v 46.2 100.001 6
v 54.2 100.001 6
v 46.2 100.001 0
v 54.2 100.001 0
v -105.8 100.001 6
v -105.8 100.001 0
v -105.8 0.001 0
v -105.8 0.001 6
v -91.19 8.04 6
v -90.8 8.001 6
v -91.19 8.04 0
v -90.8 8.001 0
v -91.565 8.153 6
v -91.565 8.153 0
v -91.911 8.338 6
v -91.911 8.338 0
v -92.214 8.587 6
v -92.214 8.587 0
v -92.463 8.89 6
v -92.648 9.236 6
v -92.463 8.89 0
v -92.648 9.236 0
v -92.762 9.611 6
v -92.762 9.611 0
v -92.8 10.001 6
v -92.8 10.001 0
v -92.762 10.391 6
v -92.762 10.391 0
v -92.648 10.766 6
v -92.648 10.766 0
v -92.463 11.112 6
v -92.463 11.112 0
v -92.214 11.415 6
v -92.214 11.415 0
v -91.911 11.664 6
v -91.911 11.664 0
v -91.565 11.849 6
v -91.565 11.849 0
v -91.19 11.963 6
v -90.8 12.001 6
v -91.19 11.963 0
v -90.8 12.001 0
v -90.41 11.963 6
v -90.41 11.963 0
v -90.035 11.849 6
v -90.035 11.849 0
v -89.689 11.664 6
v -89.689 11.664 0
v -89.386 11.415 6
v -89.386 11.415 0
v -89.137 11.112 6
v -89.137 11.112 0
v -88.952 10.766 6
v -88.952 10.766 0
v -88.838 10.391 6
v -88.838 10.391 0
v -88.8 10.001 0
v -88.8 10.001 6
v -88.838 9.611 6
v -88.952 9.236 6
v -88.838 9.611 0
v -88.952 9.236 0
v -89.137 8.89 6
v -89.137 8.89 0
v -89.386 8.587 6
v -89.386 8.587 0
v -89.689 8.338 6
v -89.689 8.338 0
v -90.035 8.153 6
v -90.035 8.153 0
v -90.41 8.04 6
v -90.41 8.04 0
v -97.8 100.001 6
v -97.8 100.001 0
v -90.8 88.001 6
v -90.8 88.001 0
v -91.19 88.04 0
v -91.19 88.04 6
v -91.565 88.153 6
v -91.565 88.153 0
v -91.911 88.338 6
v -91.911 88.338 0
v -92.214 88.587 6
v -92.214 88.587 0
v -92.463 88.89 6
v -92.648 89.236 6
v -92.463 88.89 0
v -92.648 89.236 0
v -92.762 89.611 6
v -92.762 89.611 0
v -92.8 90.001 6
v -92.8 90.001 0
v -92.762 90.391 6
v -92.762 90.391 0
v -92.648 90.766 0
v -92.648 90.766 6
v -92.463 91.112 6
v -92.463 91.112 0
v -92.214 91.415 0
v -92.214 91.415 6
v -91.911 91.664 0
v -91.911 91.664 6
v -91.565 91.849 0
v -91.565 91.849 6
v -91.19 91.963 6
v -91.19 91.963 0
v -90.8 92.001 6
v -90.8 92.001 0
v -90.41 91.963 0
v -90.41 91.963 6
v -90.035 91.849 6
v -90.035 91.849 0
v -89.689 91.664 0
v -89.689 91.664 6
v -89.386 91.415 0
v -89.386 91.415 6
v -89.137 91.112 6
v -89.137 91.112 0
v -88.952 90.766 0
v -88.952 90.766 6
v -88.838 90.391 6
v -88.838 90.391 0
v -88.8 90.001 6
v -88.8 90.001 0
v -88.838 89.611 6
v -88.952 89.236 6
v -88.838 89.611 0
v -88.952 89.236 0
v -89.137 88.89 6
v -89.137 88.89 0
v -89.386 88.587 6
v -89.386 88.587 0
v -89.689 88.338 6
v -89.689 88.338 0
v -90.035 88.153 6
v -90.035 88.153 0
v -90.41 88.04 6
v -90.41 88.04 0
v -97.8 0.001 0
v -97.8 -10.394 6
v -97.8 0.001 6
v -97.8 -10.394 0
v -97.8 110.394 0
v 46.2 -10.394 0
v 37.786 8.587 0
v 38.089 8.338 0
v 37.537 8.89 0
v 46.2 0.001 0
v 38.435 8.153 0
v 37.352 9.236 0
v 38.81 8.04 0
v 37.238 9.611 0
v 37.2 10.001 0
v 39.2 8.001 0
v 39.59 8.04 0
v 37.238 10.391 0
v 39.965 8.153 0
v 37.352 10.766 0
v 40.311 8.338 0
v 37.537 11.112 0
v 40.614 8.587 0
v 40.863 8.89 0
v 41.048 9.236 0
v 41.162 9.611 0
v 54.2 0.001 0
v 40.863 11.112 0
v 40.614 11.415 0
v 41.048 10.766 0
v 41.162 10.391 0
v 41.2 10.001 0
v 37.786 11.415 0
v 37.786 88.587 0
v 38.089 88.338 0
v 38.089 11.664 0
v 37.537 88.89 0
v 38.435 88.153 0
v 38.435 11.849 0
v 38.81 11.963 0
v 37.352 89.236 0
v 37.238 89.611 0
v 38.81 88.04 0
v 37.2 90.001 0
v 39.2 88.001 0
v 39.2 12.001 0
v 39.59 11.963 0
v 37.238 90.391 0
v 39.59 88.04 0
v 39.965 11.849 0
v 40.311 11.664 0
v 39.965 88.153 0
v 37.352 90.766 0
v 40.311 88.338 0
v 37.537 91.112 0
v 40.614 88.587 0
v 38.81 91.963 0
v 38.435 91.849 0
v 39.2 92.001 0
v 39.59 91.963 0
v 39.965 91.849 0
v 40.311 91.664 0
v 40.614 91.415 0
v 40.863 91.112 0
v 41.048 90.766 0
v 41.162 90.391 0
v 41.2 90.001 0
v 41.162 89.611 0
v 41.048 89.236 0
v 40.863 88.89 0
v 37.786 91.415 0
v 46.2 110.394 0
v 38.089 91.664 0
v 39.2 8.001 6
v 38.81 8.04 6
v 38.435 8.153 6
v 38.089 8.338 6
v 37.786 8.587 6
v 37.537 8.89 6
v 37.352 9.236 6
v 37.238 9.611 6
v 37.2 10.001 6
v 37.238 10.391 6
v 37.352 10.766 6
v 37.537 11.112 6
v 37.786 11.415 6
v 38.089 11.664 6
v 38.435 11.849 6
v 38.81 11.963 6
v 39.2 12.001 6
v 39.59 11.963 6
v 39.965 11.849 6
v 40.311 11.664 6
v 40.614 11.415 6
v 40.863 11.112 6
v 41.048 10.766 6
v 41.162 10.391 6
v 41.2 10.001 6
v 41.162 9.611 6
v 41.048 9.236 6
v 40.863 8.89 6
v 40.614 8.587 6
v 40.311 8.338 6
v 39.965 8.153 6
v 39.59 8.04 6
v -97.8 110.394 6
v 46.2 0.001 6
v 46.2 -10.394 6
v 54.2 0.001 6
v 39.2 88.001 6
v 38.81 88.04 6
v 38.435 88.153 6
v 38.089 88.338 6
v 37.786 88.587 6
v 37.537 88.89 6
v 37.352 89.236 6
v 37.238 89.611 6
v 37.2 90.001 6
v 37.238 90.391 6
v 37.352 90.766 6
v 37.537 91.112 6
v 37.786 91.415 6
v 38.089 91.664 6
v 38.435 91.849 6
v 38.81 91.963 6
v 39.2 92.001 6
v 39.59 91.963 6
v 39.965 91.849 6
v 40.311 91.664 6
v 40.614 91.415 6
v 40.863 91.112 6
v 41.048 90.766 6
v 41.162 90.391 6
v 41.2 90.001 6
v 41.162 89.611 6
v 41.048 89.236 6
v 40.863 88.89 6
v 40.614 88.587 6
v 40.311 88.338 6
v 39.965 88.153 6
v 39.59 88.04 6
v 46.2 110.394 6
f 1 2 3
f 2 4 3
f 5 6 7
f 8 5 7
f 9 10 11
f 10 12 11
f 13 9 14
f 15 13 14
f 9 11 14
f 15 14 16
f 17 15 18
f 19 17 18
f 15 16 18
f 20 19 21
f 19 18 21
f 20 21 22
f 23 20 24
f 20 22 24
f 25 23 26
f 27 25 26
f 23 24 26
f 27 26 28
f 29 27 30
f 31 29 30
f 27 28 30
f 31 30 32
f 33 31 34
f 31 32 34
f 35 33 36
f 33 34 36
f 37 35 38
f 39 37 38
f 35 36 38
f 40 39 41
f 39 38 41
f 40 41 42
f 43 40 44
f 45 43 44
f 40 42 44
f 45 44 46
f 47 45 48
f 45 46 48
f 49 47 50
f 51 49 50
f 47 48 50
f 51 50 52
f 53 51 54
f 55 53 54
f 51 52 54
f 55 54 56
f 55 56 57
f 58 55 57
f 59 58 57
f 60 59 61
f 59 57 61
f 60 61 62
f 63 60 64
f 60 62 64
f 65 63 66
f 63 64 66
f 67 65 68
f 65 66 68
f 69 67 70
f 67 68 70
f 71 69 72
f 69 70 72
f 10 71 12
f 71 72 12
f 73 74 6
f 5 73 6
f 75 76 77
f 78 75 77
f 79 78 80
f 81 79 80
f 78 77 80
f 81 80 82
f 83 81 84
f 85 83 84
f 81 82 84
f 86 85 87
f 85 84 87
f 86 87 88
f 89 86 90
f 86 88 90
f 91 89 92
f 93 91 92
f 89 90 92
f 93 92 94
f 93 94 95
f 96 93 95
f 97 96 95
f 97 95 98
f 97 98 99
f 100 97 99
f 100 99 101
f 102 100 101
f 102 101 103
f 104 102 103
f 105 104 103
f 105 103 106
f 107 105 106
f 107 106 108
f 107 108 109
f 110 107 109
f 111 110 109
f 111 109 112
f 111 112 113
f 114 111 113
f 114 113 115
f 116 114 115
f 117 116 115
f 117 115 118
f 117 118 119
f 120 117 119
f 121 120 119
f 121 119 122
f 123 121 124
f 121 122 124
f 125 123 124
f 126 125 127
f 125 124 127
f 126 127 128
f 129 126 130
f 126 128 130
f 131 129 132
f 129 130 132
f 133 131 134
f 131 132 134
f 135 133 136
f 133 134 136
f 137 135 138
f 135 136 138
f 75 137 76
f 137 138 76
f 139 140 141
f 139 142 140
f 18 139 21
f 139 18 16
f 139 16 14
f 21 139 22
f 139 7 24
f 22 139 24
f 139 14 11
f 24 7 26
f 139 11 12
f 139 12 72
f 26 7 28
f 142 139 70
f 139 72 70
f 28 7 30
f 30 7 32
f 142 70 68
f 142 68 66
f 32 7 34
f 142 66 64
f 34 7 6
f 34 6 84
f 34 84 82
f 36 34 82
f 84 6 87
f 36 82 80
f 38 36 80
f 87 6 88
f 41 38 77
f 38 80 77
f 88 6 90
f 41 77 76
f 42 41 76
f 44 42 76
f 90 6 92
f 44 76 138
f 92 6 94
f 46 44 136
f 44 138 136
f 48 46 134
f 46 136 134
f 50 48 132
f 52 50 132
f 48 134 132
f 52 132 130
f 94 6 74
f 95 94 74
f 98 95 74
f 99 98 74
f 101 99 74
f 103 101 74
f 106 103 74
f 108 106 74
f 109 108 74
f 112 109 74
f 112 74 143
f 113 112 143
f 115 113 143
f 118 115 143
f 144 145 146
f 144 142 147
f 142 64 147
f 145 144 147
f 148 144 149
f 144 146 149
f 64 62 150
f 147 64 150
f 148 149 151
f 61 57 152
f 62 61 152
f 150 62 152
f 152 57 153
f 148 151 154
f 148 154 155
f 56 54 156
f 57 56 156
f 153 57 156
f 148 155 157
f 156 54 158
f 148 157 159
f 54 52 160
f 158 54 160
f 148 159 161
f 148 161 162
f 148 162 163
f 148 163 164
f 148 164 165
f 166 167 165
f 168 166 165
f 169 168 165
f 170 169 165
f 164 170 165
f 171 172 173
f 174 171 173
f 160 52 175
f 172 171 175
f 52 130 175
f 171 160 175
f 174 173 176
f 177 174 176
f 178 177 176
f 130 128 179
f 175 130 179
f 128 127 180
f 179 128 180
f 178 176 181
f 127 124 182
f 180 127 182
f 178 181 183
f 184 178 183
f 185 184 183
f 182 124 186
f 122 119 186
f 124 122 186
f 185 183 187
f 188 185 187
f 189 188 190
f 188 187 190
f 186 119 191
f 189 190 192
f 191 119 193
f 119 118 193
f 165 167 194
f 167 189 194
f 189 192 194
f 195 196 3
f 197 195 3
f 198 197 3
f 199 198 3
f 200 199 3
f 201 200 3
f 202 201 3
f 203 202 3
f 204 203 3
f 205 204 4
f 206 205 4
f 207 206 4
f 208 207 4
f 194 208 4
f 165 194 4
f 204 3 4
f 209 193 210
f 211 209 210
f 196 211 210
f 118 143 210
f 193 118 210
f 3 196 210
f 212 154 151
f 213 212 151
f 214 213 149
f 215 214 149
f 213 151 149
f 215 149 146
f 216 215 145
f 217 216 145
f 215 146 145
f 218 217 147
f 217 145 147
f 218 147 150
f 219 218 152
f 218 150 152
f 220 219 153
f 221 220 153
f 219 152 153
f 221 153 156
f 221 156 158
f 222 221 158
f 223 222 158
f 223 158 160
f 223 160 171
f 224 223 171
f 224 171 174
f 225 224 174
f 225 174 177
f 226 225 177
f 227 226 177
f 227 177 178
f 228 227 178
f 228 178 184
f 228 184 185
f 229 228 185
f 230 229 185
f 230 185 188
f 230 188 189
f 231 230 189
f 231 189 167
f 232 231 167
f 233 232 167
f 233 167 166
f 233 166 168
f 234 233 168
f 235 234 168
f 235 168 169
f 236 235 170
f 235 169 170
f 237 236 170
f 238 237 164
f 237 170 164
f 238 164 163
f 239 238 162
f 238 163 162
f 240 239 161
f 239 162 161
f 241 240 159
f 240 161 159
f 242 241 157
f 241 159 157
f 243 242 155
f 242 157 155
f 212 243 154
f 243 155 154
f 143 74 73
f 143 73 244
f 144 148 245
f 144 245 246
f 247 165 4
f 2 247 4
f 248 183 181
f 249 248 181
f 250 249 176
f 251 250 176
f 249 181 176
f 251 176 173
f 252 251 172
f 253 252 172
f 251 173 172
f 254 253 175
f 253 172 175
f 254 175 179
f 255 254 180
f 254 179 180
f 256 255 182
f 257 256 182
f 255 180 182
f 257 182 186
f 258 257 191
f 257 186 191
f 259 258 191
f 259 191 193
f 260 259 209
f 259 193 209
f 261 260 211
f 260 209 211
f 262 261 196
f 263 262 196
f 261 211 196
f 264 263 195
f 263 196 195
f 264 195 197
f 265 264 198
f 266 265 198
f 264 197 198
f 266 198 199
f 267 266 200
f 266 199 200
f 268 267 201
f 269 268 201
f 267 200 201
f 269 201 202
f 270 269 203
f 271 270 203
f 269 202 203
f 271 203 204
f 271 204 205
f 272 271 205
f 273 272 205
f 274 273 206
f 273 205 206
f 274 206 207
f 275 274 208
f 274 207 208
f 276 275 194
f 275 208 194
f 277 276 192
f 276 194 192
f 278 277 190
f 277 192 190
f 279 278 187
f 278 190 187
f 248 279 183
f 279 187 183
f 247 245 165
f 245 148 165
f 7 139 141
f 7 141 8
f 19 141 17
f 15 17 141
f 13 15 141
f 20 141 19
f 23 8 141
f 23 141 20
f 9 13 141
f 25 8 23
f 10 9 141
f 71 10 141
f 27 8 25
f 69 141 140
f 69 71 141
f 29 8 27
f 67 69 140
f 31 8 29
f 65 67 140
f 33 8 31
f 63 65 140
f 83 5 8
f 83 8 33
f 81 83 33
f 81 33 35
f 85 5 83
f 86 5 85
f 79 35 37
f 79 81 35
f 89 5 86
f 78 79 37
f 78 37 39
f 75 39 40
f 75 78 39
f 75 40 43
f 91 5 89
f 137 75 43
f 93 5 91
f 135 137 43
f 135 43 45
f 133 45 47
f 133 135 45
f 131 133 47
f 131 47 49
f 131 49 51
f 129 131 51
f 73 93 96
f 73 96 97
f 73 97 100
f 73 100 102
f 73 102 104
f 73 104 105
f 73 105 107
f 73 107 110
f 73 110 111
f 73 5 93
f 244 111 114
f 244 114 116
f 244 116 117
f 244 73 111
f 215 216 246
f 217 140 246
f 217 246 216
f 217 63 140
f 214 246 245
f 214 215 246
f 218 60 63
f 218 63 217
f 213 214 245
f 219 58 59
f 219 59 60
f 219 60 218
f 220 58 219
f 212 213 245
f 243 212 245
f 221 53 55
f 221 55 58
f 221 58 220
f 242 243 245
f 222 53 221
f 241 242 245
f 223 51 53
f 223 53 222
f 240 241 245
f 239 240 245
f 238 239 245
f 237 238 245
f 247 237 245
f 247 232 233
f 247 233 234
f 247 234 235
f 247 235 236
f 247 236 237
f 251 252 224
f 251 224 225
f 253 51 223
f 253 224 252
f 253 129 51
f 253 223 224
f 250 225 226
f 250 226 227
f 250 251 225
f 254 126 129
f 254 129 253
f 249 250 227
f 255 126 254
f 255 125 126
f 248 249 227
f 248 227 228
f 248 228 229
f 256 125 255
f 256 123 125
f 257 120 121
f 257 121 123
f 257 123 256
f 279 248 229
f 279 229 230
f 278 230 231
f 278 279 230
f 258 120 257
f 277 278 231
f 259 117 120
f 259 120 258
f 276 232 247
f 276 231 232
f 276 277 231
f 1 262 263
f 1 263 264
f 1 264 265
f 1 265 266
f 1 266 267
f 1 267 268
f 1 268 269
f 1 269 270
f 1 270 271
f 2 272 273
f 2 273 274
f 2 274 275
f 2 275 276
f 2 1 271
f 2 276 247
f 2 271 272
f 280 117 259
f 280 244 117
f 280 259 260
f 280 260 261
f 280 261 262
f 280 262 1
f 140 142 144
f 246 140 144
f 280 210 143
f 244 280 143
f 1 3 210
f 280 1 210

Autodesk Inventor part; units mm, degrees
ref_plane "YZ Plane" through (0, 0, 0) normal (1, 0, 0) x (0, 1, 0)
ref_plane "XZ Plane" through (0, 0, 0) normal (0, 1, 0) x (-1, 0, 0)
ref_plane "XY Plane" through (0, 0, 0) normal (0, 0, 1) x (1, 0, 0)
sketch "Skizze1" plane through (0, 0, 0) normal (0, 0, 1) x (1, 0, 0)
  line L0 (-102.3641, 100) -> (-101.6, 100) construction
  line L1 (-101.6, 0) -> (-102.3641, 0) construction
  line L2 (19.2, -16.0826) -> (-120.8, -16.0826) construction
  line L3 (-120.8, -16.0826) -> (-120.8, -13.8079) construction
  line L4 (-120.8, -13.8079) -> (19.2, -13.8079) construction
  line L5 (19.2, -13.8079) -> (19.2, -16.0826) construction
  line L6 (19.2, -28.3315) -> (-120.8, -28.3315) construction
  line L7 (-120.8, -28.3315) -> (-120.8, -24.6314) construction
  line L8 (-120.8, -24.6314) -> (19.2, -24.6314) construction
  line L9 (19.2, -24.6314) -> (19.2, -28.3315) construction
  line L10 (-120.8, 124.6314) -> (-120.8, 128.3315) construction
  line L11 (19.2, 128.3315) -> (19.2, 124.6314) construction
  line L12 (19.2, 116.0826) -> (19.2, 113.8079) construction
  line L13 (0, 100) -> (0.7641, 100) construction
  line L14 (0.7641, 0) -> (0, 0) construction
  line L15 (17.6359, 100) -> (18.4, 100) construction
  line L16 (18.4, 0) -> (17.6359, 0) construction
  line L17 (5.1816, 100) -> (13.2184, 100) construction
  line L18 (13.2184, 0) -> (5.1816, 0) construction
  line L19 (69.2, -3.3397) -> (-120.8, -3.3397) construction
  line L20 (69.2, 103.3397) -> (-120.8, 103.3397) construction
  line L21 (-105.8, 0.0011) -> (54.2, 0.0011)
  line L22 (54.2, 0.0011) -> (54.2, 100.0011)
  line L23 (54.2, 100.0011) -> (-105.8, 100.0011)
  line L24 (-105.8, 100.0011) -> (-105.8, 0.0011)
  line L25 (69.2, -9.3201) -> (-120.8, -9.3201) construction
  line L26 (69.2, 109.0272) -> (-120.8, 109.0272) construction
  line L27 (-100.8, -12.3397) -> (-100.8, 0) construction
  line L28 (49.2, 0) -> (49.2, -12.3397) construction
  line L29 (-100.8, -10.3935) -> (49.2, -10.3935)
  line L30 (49.2, -10.3935) -> (49.2, 110.3935)
  line L31 (49.2, 110.3935) -> (-100.8, 110.3935)
  line L32 (-100.8, 110.3935) -> (-100.8, -10.3935)
  line L33 (-120.8, -7.2256) -> (69.2, -7.2256)
  line L34 (74.2, 45.0011) -> (74.2, -28.46)
  line L35 (74.2, -28.46) -> (69.2, -28.46)
  line L36 (69.2, -28.46) -> (69.2, -6.9656)
  line L37 (69.2, -6.9656) -> (49.2, -6.9656)
  line L38 (49.2, -6.9656) -> (49.2, 0.0011)
  line L39 (49.2, 0.0011) -> (69.2, 0.0011)
  line L40 (69.2, 0.0011) -> (69.2, 45.0011)
  line L41 (69.2, 45.0011) -> (74.2, 45.0011)
  line L42 (69.2, 110.3935) -> (-120.8, 110.3935)
  line L43 (69.2, -11.4055) -> (69.2, -10.3935)
  line L44 (69.2, -10.3935) -> (-120.8, -10.3935)
  dimension "d2" = 5
  dimension "d3" = 5
  dimension "d4" = 100
extrude "Extrusion1" add sketch "Skizze1" along normal blind 6 contours L30 L23 L22 L21 | L30 L33 L32 L21 | L21 L32 L23 L30 | L21 L24 L23 L32 | L23 L32 L31 L30 | L33 L30 L29 L32
sketch "Skizze2" plane through (0, 0, 6) normal (0, 0, 1) x (1, 0, 0)
  line L0 (49.2, 100.0011) -> (49.2, 110.3935) projected
  line L1 (-100.8, 110.3935) -> (-100.8, 100.0011) projected
  line L2 (-100.8, 100.0011) -> (-105.8, 100.0011) projected
  line L3 (-105.8, 0.0011) -> (-100.8, 0.0011) projected
  line L4 (-100.8, 0.0011) -> (-100.8, -10.3935) projected
  line L5 (49.2, -10.3935) -> (49.2, 0.0011) projected
  line L6 (49.2, 0.0011) -> (54.2, 0.0011) projected
  line L7 (54.2, 100.0011) -> (49.2, 100.0011) projected
  point P0 (0, 0)
  point P1 (39.2, 10.0011)
  point P2 (39.2, 90.0011)
  point P3 (-90.8, 90.0011)
  point P4 (-90.8, 10.0011)
  dimension "d5" = 10
  dimension "d6" = 10
  dimension "d7" = 10
  dimension "d8" = 10
  dimension "d9" = 10
  dimension "d10" = 10
  dimension "d11" = 10
  dimension "d12" = 10
hole "Bohrung1" at (39.2, 10.0011, 6) at (39.2, 90.0011, 6) at (-90.8, 90.0011, 6) at (-90.8, 10.0011, 6) direction (0, 0, -1) diameter 4 end through all
sketch "Skizze3" plane through (0, 0, 0) normal (0, 0, -1) x (-1, 0, 0)
  line L0 (105.8, 0.0011) -> (100.8, 0.0011) projected
  line L1 (100.8, 110.3935) -> (100.8, 100.0011) projected
  line L2 (-49.2, 110.3935) -> (100.8, 110.3935) projected
  line L3 (-49.2, 100.0011) -> (-49.2, 110.3935) projected
  line L4 (-49.2, -10.3935) -> (-49.2, 0.0011) projected
  line L5 (100.8, -10.3935) -> (-49.2, -10.3935) projected
  line L6 (100.8, 0.0011) -> (100.8, -10.3935) projected
  line L7 (-49.2, 100.0011) -> (-46.2, 100.0011)
  line L8 (-46.2, 100.0011) -> (-46.2, 110.3935)
  line L9 (-49.2, 0.0011) -> (-46.2, 0.0011)
  line L10 (-46.2, 0.0011) -> (-46.2, -10.3935)
  line L11 (97.8, -10.3935) -> (97.8, 0.0011)
  line L12 (97.8, 0.0011) -> (100.8, 0.0011)
  line L13 (100.8, 100.0011) -> (97.8, 100.0011)
  line L14 (97.8, 100.0011) -> (97.8, 110.3935)
  point P0 (0, 0)
  dimension "d20" = 3
  dimension "d21" = 3
extrude "Extrusion2" cut sketch "Skizze3" against normal through all
equation "\"d2\" = d3"
equation "\"d7\" = d6"
equation "\"d8\" = d5"
equation "\"d9\" = d8"
equation "\"d10\" = d9"
equation "\"d21\" = d20"
properties part number "SeitenWand" material "Holz (Birke)"
